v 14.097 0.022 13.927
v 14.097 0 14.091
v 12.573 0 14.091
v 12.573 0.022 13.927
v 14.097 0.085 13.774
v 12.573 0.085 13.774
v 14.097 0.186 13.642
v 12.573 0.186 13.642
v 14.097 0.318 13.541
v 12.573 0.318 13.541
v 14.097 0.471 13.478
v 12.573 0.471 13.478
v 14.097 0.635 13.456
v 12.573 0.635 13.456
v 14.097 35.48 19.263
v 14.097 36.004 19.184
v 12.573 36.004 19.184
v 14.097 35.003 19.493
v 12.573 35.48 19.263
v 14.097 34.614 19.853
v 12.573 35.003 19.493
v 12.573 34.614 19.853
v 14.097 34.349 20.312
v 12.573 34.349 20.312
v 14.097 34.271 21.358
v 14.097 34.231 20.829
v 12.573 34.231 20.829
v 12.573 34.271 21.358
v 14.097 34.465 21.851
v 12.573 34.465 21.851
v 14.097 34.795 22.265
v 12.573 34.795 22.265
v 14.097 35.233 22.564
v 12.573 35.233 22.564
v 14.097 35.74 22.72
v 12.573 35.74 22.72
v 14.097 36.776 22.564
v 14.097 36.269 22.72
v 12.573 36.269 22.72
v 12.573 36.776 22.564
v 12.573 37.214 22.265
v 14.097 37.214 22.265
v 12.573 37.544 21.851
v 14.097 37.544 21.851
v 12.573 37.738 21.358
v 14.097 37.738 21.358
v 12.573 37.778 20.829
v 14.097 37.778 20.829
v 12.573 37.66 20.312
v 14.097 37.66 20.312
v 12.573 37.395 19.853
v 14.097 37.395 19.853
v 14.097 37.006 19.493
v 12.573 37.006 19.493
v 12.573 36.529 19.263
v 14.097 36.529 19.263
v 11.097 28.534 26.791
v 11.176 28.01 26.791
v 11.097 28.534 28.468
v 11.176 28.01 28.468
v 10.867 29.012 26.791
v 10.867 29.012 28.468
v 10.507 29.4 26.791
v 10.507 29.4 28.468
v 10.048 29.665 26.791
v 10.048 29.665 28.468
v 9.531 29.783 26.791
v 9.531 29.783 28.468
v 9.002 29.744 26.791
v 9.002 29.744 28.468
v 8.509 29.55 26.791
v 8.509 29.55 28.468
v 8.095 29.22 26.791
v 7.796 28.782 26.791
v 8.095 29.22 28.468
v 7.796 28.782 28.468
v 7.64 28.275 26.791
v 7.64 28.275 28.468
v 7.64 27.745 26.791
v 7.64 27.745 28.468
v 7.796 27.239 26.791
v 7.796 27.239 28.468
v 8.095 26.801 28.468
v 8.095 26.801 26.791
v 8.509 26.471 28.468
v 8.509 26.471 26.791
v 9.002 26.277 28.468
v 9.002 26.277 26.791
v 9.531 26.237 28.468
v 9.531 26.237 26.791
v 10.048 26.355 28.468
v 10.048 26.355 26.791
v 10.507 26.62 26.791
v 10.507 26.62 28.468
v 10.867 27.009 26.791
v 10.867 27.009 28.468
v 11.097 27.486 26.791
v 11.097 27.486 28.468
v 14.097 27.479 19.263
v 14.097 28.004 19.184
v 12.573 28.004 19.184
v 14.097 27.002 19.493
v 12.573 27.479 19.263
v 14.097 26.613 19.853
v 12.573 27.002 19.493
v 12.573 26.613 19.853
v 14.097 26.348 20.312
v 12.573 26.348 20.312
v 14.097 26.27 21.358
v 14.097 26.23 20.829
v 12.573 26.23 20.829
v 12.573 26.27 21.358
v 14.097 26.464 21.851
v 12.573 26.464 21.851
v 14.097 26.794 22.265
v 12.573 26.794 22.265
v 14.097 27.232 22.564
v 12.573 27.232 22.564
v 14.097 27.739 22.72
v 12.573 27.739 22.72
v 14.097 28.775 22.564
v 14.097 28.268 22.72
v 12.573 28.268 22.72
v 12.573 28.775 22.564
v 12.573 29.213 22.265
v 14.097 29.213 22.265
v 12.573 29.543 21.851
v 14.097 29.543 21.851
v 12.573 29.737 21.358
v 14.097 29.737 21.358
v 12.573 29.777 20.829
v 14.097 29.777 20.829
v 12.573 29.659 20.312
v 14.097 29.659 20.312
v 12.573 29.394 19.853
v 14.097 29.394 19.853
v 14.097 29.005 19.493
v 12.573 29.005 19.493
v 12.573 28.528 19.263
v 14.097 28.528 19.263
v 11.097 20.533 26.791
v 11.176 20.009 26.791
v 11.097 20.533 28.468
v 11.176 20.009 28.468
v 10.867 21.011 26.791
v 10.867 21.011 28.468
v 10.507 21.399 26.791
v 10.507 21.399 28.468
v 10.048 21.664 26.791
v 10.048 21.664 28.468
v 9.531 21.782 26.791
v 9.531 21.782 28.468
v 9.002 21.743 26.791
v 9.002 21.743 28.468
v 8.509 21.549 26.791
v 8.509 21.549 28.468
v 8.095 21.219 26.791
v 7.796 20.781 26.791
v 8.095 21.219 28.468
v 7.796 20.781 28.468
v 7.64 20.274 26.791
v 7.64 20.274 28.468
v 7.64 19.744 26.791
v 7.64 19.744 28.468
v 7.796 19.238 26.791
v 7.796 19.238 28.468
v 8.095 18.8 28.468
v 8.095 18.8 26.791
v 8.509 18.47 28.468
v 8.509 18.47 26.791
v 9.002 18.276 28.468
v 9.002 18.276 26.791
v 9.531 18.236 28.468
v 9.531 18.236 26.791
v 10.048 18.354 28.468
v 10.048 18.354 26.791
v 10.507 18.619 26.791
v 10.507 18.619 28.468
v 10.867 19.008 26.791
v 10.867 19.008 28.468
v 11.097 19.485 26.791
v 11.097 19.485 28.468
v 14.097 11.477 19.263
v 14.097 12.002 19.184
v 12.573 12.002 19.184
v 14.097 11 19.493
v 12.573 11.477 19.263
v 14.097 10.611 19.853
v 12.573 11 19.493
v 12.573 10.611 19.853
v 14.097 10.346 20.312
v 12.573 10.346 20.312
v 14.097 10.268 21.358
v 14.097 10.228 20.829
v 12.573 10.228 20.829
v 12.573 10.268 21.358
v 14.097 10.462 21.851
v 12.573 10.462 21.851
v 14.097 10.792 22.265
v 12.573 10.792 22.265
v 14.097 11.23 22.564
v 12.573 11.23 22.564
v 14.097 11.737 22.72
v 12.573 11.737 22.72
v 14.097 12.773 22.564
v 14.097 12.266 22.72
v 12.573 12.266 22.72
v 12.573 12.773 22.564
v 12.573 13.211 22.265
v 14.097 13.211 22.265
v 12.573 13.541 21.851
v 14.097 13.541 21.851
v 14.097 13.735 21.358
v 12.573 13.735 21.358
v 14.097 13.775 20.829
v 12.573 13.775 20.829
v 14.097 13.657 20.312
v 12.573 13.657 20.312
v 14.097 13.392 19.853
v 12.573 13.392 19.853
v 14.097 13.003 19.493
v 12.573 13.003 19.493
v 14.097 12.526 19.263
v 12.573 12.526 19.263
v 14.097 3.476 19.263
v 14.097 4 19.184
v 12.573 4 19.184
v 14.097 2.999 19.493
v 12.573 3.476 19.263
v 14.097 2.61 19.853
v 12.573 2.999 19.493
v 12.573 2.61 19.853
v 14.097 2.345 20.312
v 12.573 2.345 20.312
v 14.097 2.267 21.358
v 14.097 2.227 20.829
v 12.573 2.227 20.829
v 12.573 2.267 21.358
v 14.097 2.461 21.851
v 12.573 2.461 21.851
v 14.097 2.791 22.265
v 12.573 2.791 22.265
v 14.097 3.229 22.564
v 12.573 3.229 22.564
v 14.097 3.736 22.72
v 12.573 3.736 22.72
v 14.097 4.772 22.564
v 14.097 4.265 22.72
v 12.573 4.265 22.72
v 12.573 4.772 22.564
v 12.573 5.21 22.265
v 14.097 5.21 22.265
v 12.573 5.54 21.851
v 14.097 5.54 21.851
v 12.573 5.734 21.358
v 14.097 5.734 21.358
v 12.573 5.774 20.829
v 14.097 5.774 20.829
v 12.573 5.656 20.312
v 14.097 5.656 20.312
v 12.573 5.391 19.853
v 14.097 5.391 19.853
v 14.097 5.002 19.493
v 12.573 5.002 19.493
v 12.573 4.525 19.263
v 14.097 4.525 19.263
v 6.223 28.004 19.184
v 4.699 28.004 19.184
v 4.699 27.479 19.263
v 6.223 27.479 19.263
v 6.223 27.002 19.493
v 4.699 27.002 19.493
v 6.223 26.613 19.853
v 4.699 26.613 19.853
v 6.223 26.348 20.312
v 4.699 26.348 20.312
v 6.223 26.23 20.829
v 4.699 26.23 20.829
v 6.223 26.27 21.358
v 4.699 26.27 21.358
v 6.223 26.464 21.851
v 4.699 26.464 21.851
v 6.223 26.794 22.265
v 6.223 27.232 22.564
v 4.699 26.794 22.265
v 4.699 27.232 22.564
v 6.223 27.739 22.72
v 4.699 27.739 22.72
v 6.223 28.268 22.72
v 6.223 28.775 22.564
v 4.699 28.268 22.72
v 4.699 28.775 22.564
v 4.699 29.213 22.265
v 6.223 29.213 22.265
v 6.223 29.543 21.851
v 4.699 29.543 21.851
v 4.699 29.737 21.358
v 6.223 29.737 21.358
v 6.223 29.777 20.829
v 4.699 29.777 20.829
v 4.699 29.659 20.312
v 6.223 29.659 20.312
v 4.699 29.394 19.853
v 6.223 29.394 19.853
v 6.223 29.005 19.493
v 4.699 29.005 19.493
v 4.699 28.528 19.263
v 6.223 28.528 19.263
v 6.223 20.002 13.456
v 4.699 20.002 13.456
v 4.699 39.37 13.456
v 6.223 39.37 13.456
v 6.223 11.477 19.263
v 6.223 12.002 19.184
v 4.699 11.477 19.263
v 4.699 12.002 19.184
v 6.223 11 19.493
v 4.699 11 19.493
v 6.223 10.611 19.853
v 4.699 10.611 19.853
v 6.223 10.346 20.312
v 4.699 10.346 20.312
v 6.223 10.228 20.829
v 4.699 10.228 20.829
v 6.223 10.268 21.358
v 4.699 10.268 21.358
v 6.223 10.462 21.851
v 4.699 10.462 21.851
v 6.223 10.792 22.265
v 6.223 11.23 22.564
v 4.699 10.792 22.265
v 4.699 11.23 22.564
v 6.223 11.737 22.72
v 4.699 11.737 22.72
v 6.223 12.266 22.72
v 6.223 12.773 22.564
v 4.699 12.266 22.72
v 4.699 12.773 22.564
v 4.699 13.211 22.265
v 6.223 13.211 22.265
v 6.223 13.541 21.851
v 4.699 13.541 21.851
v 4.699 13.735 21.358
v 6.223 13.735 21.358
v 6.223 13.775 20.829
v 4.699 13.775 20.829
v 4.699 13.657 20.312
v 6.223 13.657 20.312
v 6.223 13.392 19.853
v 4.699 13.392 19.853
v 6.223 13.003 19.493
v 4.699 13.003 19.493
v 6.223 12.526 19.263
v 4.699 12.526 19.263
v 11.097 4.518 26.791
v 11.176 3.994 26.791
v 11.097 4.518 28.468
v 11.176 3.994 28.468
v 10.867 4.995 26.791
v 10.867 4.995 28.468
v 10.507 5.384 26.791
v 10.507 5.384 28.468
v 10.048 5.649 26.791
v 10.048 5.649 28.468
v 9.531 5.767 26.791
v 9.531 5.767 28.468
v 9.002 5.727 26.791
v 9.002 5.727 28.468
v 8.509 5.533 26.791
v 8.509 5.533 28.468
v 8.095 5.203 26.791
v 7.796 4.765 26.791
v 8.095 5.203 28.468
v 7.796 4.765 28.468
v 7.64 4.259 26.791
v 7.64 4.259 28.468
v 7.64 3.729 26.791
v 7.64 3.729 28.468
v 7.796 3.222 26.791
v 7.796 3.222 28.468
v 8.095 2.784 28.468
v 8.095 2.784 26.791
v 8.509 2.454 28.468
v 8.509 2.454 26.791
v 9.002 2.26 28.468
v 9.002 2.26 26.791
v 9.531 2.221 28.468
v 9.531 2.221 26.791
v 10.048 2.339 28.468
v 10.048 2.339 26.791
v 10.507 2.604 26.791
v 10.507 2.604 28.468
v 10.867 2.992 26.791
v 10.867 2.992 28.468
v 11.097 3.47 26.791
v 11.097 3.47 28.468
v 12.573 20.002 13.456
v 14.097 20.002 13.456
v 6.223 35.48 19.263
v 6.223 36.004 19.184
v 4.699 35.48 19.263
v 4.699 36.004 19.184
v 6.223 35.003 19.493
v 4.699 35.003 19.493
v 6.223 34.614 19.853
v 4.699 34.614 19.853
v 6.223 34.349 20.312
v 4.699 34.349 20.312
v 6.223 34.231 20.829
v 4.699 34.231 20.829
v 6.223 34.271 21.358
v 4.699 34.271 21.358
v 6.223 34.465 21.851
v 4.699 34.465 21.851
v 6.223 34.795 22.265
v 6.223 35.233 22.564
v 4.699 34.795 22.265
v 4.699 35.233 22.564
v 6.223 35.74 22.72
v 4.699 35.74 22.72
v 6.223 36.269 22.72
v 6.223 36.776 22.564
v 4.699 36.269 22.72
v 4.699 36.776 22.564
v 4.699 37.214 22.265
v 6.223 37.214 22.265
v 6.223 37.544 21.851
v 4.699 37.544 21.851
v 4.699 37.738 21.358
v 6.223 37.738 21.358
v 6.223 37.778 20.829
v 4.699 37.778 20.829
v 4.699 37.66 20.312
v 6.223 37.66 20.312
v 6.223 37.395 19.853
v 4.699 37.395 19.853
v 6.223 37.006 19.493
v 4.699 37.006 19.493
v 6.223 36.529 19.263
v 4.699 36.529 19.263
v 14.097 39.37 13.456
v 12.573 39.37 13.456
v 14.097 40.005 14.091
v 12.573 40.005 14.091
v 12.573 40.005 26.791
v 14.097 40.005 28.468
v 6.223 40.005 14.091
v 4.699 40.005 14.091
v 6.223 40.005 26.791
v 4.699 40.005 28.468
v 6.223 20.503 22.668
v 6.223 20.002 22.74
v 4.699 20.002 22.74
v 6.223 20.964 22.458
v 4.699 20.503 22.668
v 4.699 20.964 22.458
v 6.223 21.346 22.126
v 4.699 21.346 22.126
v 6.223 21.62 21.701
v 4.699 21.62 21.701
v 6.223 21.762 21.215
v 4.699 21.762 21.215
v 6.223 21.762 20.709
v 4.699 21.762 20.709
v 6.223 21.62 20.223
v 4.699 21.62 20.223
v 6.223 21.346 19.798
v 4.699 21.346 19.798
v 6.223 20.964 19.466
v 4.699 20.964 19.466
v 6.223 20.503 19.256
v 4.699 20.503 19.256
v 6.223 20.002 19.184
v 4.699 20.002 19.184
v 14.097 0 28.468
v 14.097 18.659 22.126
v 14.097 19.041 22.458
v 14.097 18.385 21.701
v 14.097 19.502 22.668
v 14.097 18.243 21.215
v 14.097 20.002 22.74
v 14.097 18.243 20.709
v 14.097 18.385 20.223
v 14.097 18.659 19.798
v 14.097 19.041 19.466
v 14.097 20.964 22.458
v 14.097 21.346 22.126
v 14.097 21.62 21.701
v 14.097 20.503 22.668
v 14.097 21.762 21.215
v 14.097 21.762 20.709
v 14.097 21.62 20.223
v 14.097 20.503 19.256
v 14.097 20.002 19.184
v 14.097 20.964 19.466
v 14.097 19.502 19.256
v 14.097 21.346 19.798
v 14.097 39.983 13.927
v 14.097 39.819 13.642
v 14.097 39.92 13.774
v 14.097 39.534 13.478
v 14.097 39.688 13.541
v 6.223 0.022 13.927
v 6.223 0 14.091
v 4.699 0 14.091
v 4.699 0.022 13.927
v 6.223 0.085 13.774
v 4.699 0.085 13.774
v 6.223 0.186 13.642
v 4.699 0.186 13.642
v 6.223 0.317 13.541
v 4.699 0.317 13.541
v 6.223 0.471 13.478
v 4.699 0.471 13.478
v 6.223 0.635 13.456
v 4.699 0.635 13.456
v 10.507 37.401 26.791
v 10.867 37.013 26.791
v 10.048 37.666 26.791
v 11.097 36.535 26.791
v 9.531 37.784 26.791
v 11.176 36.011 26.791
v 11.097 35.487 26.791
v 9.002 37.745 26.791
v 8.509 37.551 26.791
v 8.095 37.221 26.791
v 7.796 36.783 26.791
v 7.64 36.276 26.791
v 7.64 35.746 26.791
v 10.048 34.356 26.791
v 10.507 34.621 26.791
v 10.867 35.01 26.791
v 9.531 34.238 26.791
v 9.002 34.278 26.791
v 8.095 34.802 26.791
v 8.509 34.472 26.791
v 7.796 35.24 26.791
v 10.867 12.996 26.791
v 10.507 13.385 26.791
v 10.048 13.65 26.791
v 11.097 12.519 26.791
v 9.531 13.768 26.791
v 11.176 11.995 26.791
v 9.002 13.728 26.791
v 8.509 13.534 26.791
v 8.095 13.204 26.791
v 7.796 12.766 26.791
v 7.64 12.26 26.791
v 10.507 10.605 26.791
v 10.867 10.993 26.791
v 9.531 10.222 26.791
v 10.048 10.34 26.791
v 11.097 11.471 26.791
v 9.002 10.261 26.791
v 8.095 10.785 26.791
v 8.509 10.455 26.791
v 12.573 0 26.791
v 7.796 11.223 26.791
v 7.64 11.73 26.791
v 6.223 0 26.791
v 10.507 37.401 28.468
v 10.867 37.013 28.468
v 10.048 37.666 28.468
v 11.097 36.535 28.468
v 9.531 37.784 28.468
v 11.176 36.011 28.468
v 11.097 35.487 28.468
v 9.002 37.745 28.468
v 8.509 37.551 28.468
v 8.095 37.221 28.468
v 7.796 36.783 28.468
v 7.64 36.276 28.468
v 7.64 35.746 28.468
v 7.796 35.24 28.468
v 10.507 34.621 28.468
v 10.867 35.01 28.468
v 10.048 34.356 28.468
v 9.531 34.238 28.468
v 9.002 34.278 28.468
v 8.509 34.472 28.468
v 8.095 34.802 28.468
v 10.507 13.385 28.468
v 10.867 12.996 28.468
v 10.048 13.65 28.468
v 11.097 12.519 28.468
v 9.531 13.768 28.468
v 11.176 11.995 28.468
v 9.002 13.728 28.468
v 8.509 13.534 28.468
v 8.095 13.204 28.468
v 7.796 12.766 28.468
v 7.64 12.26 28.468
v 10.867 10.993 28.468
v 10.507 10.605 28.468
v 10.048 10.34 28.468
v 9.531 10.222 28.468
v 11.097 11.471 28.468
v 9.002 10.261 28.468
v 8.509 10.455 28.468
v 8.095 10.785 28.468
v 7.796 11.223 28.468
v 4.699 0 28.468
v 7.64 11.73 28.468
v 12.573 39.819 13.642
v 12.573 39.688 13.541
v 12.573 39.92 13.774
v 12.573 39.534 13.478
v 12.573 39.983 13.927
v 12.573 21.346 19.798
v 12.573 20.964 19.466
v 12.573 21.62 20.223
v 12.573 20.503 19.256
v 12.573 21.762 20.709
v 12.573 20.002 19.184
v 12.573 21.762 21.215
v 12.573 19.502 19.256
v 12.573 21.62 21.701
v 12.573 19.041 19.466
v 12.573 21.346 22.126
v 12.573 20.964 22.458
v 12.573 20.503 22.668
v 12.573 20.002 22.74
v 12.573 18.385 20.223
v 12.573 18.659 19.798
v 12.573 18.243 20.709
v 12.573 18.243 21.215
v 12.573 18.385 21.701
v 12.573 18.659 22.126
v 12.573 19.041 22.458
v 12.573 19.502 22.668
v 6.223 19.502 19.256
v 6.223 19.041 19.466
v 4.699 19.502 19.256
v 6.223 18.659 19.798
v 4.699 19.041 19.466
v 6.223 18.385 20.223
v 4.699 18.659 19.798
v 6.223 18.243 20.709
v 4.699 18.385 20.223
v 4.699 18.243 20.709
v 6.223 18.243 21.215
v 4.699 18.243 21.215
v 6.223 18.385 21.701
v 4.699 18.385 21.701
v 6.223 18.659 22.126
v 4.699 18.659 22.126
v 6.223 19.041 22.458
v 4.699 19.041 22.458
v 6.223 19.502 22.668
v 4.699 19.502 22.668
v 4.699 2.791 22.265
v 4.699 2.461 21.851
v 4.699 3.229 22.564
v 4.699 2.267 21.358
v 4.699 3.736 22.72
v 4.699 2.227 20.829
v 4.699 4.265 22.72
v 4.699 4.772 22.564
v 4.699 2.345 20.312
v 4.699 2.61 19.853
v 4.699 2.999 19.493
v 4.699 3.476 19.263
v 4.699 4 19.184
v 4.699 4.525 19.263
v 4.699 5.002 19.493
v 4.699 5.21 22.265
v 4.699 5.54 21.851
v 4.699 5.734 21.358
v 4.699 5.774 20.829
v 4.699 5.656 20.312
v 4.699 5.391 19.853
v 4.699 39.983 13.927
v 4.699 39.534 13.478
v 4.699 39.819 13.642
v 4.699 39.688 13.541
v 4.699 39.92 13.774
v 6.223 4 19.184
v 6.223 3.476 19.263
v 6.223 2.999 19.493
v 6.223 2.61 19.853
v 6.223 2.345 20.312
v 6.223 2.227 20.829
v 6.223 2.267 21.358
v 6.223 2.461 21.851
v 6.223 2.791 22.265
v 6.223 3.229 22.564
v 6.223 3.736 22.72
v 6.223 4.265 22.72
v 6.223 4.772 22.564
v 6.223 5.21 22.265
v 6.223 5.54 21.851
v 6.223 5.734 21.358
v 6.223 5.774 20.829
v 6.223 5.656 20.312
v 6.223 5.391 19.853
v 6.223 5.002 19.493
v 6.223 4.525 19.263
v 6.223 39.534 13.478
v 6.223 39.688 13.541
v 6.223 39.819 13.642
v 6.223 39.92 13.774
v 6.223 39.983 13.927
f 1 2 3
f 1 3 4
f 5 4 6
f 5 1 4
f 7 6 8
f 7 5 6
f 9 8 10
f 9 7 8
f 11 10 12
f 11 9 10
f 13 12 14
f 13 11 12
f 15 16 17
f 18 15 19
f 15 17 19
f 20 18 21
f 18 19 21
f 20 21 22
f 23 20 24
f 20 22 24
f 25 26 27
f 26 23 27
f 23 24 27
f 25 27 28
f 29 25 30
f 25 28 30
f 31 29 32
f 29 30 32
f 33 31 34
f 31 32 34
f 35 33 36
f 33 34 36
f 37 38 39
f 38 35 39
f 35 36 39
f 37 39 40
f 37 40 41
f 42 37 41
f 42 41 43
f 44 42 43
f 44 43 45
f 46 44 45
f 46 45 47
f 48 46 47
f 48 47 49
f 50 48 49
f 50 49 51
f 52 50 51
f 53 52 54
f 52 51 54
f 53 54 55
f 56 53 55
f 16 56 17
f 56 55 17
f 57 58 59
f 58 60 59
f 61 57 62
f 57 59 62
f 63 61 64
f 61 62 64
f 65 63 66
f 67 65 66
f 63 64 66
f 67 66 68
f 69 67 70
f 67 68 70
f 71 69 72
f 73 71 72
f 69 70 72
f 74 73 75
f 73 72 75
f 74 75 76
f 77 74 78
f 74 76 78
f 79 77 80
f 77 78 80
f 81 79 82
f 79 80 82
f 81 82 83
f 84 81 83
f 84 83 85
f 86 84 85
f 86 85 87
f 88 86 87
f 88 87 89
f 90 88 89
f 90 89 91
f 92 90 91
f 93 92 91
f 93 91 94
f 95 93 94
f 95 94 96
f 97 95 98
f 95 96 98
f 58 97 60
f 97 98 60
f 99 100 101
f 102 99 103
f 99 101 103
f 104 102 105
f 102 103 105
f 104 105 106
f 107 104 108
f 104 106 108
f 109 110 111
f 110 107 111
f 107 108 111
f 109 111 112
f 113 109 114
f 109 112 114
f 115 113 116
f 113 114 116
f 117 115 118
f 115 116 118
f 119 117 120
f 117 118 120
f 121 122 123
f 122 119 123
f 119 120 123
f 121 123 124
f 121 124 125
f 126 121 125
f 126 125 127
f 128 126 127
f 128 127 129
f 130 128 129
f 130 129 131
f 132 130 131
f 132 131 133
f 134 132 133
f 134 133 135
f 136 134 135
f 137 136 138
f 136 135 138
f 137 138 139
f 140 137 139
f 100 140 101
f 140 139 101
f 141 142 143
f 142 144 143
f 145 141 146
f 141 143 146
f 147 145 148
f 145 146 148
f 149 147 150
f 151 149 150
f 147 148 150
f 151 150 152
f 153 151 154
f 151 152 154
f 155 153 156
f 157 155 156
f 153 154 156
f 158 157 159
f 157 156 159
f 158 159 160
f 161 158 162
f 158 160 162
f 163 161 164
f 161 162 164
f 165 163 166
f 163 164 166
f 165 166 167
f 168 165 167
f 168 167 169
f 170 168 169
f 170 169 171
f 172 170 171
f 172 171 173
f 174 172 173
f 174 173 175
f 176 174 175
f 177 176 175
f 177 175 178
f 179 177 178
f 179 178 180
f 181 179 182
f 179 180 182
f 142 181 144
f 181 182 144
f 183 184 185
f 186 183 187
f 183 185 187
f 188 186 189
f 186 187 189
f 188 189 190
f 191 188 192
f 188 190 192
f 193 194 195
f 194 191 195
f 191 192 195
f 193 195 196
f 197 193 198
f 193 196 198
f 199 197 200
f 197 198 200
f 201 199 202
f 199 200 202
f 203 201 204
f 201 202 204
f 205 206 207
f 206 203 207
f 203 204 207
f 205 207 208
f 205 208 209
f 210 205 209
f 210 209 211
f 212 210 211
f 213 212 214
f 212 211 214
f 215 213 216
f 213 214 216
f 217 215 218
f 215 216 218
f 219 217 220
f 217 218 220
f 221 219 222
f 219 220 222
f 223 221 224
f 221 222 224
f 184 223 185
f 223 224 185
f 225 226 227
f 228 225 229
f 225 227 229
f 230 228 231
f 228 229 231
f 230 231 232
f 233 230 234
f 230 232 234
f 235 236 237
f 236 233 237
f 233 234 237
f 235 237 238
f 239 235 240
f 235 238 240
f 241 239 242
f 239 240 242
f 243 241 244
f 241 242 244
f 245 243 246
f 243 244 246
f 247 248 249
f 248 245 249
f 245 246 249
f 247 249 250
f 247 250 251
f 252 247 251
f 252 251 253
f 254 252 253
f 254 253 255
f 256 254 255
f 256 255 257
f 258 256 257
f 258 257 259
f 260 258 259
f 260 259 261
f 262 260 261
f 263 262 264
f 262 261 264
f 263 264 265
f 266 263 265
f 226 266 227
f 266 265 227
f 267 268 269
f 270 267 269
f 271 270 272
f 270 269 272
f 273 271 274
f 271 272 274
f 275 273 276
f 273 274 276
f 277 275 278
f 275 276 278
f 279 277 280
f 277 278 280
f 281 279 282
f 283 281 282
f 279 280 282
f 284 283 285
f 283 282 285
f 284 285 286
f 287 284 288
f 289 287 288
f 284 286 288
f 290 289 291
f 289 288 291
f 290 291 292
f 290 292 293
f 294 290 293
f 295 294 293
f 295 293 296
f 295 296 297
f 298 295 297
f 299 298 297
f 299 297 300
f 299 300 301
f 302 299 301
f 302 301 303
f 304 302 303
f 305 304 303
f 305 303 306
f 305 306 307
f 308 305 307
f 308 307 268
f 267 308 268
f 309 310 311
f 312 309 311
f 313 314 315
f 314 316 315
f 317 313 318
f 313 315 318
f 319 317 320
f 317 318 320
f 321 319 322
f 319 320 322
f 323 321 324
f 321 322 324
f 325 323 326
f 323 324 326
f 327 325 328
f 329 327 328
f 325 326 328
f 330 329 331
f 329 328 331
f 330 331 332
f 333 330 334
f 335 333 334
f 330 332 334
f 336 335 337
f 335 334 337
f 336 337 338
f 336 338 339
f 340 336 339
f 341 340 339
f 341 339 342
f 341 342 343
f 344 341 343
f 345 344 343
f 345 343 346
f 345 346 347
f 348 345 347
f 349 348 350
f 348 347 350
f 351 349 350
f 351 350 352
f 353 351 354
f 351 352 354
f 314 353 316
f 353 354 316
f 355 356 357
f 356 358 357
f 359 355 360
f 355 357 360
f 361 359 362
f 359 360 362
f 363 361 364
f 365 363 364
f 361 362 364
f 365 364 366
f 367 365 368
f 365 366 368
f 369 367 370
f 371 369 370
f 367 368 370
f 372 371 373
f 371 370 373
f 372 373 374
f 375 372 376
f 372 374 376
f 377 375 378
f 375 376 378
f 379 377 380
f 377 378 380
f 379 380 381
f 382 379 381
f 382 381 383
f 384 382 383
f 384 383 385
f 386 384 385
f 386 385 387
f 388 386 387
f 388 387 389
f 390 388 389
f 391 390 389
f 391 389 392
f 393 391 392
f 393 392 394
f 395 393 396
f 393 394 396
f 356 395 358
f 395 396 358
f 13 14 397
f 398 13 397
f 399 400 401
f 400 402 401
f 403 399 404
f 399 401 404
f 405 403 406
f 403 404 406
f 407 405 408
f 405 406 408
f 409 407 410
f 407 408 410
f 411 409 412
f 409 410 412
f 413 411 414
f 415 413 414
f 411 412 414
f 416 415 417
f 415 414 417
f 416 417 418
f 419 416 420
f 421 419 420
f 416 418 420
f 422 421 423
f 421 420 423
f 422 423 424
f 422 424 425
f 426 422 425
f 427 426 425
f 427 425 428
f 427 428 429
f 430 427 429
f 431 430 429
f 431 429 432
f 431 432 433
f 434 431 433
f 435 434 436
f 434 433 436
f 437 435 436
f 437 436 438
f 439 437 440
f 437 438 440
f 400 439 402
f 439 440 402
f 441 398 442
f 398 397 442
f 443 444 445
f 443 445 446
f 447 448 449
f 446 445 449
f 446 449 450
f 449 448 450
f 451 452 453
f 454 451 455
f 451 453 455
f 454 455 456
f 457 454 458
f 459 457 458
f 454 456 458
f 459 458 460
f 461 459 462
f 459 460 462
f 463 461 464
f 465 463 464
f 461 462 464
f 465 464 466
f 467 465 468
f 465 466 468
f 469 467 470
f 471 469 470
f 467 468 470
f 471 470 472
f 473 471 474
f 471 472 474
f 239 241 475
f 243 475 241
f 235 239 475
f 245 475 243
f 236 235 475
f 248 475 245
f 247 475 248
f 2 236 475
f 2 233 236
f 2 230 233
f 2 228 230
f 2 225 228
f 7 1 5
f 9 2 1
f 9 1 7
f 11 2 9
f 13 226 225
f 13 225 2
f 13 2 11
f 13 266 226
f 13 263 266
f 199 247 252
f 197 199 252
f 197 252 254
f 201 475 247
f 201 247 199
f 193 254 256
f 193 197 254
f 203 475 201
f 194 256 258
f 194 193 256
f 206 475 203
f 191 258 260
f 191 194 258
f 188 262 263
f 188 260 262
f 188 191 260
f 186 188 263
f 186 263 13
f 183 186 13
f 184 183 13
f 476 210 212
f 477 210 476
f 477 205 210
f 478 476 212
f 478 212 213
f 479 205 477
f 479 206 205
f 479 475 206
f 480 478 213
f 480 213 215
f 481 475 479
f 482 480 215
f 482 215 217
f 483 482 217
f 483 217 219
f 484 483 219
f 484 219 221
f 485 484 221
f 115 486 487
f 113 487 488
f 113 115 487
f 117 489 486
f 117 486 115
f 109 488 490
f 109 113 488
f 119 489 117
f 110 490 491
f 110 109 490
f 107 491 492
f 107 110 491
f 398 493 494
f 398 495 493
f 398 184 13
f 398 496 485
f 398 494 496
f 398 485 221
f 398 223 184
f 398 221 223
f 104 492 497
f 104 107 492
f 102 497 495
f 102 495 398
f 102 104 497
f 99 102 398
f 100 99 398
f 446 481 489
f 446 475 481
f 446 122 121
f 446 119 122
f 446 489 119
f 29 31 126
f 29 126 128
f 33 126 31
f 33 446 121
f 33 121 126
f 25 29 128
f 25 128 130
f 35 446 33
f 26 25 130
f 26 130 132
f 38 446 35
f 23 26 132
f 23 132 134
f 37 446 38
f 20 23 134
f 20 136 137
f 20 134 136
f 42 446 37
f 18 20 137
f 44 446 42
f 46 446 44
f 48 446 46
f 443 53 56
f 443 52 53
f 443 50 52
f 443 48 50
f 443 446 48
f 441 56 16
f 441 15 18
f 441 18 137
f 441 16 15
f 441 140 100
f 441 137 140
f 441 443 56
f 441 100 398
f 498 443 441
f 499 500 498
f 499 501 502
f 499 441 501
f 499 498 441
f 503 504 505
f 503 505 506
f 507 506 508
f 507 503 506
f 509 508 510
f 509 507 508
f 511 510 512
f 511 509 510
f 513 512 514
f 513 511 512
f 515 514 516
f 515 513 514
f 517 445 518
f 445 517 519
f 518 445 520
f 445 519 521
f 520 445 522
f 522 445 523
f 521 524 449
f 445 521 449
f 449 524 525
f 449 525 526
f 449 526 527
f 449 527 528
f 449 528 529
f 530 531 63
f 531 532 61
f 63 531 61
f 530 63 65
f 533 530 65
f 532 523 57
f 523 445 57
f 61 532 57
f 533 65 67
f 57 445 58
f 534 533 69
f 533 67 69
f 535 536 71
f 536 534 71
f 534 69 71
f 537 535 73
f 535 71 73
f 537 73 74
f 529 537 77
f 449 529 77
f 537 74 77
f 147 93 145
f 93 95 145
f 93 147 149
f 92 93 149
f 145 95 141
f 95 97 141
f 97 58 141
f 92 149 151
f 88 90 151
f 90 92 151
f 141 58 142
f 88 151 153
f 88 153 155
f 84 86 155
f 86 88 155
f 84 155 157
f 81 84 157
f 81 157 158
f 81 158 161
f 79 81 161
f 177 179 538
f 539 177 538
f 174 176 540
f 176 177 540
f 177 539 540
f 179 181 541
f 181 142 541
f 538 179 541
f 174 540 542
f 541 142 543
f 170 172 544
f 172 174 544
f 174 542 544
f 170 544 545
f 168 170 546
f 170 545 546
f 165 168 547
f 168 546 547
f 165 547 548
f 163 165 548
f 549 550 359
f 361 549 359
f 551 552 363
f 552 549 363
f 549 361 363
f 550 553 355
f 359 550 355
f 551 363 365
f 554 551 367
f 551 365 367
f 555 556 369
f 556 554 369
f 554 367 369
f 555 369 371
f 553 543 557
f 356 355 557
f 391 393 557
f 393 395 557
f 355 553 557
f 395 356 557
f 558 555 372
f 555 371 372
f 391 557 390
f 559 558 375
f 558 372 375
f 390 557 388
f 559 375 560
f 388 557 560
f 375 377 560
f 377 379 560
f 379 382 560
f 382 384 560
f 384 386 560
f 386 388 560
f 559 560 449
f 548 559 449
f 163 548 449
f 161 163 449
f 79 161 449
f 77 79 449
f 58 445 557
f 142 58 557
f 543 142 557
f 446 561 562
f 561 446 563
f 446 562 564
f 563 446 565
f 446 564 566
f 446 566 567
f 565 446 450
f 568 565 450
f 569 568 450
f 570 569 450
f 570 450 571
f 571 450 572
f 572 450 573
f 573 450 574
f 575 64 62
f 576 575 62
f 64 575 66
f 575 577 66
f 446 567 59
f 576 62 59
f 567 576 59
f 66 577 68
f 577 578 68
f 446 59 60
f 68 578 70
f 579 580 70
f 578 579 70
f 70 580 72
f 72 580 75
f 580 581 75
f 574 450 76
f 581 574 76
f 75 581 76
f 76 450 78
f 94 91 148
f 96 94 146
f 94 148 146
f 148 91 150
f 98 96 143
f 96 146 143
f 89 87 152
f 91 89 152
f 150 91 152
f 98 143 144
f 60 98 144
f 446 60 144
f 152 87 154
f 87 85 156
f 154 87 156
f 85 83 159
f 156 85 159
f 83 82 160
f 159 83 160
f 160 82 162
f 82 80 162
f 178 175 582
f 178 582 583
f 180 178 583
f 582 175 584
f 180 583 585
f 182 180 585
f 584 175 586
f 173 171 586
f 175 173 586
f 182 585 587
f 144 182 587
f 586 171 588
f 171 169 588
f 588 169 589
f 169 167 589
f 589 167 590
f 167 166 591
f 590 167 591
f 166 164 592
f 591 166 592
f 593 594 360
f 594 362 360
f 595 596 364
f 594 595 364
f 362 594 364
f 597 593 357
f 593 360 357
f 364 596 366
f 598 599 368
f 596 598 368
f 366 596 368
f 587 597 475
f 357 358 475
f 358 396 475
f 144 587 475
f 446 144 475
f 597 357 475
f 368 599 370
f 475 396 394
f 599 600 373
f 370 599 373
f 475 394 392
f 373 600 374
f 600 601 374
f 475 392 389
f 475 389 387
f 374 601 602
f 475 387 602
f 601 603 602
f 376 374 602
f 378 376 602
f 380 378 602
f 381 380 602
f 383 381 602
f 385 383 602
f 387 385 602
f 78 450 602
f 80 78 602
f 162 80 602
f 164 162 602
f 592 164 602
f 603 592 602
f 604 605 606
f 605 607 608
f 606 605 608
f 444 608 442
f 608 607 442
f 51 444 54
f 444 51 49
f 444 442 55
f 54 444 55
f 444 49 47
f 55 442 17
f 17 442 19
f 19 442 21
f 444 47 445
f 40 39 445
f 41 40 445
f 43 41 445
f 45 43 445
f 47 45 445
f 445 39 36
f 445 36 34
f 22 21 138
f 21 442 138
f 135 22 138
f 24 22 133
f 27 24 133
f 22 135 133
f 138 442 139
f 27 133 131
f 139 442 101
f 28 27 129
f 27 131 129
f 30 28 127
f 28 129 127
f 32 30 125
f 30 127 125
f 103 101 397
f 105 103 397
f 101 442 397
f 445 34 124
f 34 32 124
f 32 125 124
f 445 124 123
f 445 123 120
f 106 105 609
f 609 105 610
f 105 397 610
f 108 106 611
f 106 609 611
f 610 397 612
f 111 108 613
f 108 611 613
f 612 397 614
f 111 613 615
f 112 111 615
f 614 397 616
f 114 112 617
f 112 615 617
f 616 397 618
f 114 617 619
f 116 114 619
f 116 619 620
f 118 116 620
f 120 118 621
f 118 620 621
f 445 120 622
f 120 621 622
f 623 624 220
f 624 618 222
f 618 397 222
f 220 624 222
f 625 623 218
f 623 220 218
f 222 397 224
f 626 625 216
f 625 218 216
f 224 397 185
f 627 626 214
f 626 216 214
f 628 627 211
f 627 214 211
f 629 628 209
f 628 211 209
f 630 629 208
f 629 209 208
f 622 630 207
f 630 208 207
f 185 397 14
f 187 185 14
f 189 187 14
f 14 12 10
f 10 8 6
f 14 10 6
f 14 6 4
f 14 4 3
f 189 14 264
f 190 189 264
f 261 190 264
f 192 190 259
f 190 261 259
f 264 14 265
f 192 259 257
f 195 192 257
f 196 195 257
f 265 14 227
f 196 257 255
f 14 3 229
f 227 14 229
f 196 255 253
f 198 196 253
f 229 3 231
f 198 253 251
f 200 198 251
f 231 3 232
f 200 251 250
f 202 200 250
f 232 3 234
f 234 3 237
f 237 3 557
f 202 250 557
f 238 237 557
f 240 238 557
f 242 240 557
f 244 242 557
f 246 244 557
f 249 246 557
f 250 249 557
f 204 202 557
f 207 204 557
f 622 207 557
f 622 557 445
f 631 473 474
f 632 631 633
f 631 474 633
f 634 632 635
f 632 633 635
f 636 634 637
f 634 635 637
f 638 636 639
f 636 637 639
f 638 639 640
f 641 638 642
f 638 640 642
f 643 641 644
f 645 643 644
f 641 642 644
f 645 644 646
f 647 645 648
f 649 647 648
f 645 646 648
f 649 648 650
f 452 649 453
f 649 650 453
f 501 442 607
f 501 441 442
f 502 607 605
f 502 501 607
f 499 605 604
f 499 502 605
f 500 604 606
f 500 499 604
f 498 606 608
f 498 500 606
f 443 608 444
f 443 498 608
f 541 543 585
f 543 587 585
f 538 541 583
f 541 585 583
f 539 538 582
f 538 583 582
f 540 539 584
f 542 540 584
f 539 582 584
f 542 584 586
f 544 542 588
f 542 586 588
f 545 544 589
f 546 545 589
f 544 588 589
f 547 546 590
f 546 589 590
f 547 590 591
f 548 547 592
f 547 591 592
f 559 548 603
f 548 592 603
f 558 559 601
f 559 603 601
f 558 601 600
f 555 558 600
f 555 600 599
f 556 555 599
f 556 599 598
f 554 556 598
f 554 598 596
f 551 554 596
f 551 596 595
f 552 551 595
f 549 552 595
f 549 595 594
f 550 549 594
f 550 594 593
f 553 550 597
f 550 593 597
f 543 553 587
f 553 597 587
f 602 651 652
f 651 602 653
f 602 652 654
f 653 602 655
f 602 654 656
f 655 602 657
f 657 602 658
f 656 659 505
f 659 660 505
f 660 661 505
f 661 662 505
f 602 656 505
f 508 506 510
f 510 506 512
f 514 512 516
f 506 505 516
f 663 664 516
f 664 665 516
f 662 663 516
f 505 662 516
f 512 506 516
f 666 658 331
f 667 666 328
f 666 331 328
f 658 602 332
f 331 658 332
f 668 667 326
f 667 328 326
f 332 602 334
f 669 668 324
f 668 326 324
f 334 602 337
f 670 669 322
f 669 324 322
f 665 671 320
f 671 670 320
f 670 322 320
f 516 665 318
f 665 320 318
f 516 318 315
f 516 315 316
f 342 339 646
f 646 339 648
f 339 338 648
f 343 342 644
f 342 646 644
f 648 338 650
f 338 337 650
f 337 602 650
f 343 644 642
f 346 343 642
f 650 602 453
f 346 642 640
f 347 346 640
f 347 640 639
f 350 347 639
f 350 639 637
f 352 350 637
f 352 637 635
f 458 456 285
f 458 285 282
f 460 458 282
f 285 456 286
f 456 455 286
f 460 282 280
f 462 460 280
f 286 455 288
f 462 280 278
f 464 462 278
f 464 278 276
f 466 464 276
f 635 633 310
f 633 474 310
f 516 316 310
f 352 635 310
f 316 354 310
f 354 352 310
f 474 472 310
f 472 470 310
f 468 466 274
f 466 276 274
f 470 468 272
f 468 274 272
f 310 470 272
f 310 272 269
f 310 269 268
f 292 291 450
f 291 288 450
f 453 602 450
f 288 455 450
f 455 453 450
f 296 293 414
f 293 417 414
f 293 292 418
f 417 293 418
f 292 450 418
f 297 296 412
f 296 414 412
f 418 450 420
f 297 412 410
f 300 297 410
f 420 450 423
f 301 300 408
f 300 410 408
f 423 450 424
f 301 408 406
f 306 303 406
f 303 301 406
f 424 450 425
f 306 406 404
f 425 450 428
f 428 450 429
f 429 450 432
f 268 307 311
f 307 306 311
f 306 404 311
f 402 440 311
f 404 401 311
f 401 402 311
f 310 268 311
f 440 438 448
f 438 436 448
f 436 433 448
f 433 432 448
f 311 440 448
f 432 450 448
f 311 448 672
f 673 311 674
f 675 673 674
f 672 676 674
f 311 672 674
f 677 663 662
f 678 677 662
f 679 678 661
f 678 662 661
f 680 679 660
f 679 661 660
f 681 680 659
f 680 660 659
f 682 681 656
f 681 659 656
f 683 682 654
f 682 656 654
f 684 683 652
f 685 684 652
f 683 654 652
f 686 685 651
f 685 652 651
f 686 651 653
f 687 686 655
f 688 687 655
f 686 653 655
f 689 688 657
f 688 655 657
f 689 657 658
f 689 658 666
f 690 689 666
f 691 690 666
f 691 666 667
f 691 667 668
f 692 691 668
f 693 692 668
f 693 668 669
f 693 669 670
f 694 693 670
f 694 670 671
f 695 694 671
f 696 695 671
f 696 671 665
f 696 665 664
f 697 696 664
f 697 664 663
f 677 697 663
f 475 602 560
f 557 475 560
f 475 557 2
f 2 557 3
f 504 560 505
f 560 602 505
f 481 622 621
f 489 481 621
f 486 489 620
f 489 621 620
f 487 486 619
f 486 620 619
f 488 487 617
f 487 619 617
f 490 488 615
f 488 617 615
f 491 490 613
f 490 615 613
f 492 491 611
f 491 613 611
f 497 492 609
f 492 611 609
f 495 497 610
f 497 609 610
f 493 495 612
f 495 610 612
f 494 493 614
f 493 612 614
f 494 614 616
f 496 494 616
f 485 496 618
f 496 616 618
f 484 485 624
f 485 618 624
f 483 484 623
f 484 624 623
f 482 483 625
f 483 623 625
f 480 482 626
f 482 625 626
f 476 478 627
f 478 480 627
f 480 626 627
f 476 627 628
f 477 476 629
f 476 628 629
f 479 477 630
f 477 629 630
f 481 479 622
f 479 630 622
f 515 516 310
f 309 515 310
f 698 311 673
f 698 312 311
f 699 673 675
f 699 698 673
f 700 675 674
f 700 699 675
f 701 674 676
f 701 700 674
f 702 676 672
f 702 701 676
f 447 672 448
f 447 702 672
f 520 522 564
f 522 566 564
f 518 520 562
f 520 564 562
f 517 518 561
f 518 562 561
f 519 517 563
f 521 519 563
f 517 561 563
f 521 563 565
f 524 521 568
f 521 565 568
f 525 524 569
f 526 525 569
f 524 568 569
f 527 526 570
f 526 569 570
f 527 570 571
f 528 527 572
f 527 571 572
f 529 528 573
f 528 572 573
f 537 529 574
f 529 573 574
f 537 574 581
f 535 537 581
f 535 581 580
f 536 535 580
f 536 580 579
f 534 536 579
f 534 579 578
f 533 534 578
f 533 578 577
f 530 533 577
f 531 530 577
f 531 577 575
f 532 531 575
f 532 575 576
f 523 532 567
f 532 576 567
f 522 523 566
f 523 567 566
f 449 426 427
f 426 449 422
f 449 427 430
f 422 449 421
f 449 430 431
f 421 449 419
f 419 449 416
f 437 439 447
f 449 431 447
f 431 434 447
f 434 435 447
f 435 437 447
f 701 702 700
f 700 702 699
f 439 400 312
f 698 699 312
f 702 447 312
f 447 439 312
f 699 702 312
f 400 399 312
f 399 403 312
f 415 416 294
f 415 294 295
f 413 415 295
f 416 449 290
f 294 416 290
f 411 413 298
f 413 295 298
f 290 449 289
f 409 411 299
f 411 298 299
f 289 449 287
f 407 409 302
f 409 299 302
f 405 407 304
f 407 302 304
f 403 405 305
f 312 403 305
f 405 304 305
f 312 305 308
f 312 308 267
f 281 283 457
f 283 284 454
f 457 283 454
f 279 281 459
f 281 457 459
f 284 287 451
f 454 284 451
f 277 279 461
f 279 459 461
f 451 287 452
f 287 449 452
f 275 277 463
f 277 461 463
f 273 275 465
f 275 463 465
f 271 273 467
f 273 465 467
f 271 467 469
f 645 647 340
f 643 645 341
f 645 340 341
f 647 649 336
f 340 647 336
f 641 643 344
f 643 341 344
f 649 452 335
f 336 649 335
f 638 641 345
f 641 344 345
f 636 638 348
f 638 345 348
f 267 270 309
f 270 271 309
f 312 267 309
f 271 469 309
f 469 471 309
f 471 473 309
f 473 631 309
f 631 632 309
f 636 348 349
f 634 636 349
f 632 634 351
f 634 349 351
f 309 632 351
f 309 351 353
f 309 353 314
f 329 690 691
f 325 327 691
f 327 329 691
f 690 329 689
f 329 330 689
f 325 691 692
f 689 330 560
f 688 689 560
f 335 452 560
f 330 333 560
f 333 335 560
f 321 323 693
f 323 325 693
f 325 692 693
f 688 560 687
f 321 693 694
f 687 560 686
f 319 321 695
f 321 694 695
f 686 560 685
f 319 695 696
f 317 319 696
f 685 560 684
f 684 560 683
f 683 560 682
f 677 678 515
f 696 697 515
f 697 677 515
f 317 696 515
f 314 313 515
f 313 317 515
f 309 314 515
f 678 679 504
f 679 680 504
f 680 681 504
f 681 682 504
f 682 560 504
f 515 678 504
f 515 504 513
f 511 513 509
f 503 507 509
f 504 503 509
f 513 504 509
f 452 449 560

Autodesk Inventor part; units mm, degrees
ref_plane "YZ Plane" through (0, 0, 0) normal (1, 0, 0) x (0, 1, 0)
ref_plane "Work Plane1" through (4.699, 0, 1.524) normal (1, 0, 0) x (0, 0, -1)
sketch "Sketch1" plane through (4.699, 0, 1.524) normal (1, 0, 0) x (0, 0, -1)
  line L0 (-11.9322, 40.005) -> (-26.9436, 40.005)
  line L1 (-26.9436, 40.005) -> (-26.9436, 0)
  line L2 (-26.9436, 0) -> (-11.9322, 0)
  line L3 (-11.9322, 0) -> (-11.9322, 40.005)
  circle A0 centre (-19.4379, 20.0025) radius 1.778
  circle A1 centre (-19.4379, 28.0035) radius 1.778
  circle A2 centre (-19.4379, 36.0045) radius 1.778
  line L4 (-11.9322, 20.0025) -> (-25.268, 20.0025)
  circle A3 centre (-19.4379, 12.0015) radius 1.778
  circle A4 centre (-19.4379, 4.0005) radius 1.778
  point P0 (1.524, 0)
  dimension "d0" = 40.005
  dimension "d1" = 15.0114
  dimension "d2" = 3.556
  dimension "d3" = 3.556
  dimension "d4" = 3.556
  dimension "d6" = 8.001
  dimension "d7" = 8.001
extrude "Extrusion1" add sketch "Sketch1" along normal blind 9.398
ref_plane "Work Plane2" through (4.699, 0, 13.4562) normal (0, -1, 0) x (1, 0, 0)
sketch "Sketch2" plane through (4.699, 0, 13.4562) normal (0, -1, 0) x (1, 0, 0)
  line L0 (0, 0) -> (9.398, 0) construction
  line L1 (9.398, 15.0114) -> (9.398, 0) construction
  line L2 (7.874, 13.335) -> (1.524, 13.335)
  line L3 (1.524, 13.335) -> (1.524, 0)
  line L4 (1.524, 0) -> (7.874, 0)
  line L5 (7.874, 0) -> (7.874, 13.335)
  line L6 (0, 0) -> (9.398, 0) construction
  point P0 (-4.699, -13.4562)
  dimension "d10" = 6.35
  dimension "d11" = 1.524
  dimension "d13" = 13.335
extrude "Extrusion2" cut sketch "Sketch2" against normal through all
sketch "Sketch3" plane through (4.699, 0, 28.4676) normal (0, 0, 1) x (1, 0, 0)
  circle A0 centre (4.699, 28.0103) radius 1.778
  circle A1 centre (4.699, 36.0113) radius 1.778
  circle A2 centre (4.699, 20.0093) radius 1.778
  line L0 (0, 18.2245) -> (0, 21.7805) construction
  circle A3 centre (4.699, 11.9947) radius 1.778
  circle A4 centre (4.699, 3.9937) radius 1.778
  point P0 (-4.699, 0)
  dimension "d16" = 3.556
  dimension "d17" = 3.556
  dimension "d19" = 8.001
  dimension "d20" = 8.001
extrude "Extrusion3" cut sketch "Sketch3" against normal through all
fillet "Fillet1" radius 0.635 4 edges at (5.461, 40.005, 13.4562) (5.461, 0, 13.4562) (13.335, 0, 13.4562) (13.335, 40.005, 13.4562)
properties part number "Mini Channel 5 Holes"
